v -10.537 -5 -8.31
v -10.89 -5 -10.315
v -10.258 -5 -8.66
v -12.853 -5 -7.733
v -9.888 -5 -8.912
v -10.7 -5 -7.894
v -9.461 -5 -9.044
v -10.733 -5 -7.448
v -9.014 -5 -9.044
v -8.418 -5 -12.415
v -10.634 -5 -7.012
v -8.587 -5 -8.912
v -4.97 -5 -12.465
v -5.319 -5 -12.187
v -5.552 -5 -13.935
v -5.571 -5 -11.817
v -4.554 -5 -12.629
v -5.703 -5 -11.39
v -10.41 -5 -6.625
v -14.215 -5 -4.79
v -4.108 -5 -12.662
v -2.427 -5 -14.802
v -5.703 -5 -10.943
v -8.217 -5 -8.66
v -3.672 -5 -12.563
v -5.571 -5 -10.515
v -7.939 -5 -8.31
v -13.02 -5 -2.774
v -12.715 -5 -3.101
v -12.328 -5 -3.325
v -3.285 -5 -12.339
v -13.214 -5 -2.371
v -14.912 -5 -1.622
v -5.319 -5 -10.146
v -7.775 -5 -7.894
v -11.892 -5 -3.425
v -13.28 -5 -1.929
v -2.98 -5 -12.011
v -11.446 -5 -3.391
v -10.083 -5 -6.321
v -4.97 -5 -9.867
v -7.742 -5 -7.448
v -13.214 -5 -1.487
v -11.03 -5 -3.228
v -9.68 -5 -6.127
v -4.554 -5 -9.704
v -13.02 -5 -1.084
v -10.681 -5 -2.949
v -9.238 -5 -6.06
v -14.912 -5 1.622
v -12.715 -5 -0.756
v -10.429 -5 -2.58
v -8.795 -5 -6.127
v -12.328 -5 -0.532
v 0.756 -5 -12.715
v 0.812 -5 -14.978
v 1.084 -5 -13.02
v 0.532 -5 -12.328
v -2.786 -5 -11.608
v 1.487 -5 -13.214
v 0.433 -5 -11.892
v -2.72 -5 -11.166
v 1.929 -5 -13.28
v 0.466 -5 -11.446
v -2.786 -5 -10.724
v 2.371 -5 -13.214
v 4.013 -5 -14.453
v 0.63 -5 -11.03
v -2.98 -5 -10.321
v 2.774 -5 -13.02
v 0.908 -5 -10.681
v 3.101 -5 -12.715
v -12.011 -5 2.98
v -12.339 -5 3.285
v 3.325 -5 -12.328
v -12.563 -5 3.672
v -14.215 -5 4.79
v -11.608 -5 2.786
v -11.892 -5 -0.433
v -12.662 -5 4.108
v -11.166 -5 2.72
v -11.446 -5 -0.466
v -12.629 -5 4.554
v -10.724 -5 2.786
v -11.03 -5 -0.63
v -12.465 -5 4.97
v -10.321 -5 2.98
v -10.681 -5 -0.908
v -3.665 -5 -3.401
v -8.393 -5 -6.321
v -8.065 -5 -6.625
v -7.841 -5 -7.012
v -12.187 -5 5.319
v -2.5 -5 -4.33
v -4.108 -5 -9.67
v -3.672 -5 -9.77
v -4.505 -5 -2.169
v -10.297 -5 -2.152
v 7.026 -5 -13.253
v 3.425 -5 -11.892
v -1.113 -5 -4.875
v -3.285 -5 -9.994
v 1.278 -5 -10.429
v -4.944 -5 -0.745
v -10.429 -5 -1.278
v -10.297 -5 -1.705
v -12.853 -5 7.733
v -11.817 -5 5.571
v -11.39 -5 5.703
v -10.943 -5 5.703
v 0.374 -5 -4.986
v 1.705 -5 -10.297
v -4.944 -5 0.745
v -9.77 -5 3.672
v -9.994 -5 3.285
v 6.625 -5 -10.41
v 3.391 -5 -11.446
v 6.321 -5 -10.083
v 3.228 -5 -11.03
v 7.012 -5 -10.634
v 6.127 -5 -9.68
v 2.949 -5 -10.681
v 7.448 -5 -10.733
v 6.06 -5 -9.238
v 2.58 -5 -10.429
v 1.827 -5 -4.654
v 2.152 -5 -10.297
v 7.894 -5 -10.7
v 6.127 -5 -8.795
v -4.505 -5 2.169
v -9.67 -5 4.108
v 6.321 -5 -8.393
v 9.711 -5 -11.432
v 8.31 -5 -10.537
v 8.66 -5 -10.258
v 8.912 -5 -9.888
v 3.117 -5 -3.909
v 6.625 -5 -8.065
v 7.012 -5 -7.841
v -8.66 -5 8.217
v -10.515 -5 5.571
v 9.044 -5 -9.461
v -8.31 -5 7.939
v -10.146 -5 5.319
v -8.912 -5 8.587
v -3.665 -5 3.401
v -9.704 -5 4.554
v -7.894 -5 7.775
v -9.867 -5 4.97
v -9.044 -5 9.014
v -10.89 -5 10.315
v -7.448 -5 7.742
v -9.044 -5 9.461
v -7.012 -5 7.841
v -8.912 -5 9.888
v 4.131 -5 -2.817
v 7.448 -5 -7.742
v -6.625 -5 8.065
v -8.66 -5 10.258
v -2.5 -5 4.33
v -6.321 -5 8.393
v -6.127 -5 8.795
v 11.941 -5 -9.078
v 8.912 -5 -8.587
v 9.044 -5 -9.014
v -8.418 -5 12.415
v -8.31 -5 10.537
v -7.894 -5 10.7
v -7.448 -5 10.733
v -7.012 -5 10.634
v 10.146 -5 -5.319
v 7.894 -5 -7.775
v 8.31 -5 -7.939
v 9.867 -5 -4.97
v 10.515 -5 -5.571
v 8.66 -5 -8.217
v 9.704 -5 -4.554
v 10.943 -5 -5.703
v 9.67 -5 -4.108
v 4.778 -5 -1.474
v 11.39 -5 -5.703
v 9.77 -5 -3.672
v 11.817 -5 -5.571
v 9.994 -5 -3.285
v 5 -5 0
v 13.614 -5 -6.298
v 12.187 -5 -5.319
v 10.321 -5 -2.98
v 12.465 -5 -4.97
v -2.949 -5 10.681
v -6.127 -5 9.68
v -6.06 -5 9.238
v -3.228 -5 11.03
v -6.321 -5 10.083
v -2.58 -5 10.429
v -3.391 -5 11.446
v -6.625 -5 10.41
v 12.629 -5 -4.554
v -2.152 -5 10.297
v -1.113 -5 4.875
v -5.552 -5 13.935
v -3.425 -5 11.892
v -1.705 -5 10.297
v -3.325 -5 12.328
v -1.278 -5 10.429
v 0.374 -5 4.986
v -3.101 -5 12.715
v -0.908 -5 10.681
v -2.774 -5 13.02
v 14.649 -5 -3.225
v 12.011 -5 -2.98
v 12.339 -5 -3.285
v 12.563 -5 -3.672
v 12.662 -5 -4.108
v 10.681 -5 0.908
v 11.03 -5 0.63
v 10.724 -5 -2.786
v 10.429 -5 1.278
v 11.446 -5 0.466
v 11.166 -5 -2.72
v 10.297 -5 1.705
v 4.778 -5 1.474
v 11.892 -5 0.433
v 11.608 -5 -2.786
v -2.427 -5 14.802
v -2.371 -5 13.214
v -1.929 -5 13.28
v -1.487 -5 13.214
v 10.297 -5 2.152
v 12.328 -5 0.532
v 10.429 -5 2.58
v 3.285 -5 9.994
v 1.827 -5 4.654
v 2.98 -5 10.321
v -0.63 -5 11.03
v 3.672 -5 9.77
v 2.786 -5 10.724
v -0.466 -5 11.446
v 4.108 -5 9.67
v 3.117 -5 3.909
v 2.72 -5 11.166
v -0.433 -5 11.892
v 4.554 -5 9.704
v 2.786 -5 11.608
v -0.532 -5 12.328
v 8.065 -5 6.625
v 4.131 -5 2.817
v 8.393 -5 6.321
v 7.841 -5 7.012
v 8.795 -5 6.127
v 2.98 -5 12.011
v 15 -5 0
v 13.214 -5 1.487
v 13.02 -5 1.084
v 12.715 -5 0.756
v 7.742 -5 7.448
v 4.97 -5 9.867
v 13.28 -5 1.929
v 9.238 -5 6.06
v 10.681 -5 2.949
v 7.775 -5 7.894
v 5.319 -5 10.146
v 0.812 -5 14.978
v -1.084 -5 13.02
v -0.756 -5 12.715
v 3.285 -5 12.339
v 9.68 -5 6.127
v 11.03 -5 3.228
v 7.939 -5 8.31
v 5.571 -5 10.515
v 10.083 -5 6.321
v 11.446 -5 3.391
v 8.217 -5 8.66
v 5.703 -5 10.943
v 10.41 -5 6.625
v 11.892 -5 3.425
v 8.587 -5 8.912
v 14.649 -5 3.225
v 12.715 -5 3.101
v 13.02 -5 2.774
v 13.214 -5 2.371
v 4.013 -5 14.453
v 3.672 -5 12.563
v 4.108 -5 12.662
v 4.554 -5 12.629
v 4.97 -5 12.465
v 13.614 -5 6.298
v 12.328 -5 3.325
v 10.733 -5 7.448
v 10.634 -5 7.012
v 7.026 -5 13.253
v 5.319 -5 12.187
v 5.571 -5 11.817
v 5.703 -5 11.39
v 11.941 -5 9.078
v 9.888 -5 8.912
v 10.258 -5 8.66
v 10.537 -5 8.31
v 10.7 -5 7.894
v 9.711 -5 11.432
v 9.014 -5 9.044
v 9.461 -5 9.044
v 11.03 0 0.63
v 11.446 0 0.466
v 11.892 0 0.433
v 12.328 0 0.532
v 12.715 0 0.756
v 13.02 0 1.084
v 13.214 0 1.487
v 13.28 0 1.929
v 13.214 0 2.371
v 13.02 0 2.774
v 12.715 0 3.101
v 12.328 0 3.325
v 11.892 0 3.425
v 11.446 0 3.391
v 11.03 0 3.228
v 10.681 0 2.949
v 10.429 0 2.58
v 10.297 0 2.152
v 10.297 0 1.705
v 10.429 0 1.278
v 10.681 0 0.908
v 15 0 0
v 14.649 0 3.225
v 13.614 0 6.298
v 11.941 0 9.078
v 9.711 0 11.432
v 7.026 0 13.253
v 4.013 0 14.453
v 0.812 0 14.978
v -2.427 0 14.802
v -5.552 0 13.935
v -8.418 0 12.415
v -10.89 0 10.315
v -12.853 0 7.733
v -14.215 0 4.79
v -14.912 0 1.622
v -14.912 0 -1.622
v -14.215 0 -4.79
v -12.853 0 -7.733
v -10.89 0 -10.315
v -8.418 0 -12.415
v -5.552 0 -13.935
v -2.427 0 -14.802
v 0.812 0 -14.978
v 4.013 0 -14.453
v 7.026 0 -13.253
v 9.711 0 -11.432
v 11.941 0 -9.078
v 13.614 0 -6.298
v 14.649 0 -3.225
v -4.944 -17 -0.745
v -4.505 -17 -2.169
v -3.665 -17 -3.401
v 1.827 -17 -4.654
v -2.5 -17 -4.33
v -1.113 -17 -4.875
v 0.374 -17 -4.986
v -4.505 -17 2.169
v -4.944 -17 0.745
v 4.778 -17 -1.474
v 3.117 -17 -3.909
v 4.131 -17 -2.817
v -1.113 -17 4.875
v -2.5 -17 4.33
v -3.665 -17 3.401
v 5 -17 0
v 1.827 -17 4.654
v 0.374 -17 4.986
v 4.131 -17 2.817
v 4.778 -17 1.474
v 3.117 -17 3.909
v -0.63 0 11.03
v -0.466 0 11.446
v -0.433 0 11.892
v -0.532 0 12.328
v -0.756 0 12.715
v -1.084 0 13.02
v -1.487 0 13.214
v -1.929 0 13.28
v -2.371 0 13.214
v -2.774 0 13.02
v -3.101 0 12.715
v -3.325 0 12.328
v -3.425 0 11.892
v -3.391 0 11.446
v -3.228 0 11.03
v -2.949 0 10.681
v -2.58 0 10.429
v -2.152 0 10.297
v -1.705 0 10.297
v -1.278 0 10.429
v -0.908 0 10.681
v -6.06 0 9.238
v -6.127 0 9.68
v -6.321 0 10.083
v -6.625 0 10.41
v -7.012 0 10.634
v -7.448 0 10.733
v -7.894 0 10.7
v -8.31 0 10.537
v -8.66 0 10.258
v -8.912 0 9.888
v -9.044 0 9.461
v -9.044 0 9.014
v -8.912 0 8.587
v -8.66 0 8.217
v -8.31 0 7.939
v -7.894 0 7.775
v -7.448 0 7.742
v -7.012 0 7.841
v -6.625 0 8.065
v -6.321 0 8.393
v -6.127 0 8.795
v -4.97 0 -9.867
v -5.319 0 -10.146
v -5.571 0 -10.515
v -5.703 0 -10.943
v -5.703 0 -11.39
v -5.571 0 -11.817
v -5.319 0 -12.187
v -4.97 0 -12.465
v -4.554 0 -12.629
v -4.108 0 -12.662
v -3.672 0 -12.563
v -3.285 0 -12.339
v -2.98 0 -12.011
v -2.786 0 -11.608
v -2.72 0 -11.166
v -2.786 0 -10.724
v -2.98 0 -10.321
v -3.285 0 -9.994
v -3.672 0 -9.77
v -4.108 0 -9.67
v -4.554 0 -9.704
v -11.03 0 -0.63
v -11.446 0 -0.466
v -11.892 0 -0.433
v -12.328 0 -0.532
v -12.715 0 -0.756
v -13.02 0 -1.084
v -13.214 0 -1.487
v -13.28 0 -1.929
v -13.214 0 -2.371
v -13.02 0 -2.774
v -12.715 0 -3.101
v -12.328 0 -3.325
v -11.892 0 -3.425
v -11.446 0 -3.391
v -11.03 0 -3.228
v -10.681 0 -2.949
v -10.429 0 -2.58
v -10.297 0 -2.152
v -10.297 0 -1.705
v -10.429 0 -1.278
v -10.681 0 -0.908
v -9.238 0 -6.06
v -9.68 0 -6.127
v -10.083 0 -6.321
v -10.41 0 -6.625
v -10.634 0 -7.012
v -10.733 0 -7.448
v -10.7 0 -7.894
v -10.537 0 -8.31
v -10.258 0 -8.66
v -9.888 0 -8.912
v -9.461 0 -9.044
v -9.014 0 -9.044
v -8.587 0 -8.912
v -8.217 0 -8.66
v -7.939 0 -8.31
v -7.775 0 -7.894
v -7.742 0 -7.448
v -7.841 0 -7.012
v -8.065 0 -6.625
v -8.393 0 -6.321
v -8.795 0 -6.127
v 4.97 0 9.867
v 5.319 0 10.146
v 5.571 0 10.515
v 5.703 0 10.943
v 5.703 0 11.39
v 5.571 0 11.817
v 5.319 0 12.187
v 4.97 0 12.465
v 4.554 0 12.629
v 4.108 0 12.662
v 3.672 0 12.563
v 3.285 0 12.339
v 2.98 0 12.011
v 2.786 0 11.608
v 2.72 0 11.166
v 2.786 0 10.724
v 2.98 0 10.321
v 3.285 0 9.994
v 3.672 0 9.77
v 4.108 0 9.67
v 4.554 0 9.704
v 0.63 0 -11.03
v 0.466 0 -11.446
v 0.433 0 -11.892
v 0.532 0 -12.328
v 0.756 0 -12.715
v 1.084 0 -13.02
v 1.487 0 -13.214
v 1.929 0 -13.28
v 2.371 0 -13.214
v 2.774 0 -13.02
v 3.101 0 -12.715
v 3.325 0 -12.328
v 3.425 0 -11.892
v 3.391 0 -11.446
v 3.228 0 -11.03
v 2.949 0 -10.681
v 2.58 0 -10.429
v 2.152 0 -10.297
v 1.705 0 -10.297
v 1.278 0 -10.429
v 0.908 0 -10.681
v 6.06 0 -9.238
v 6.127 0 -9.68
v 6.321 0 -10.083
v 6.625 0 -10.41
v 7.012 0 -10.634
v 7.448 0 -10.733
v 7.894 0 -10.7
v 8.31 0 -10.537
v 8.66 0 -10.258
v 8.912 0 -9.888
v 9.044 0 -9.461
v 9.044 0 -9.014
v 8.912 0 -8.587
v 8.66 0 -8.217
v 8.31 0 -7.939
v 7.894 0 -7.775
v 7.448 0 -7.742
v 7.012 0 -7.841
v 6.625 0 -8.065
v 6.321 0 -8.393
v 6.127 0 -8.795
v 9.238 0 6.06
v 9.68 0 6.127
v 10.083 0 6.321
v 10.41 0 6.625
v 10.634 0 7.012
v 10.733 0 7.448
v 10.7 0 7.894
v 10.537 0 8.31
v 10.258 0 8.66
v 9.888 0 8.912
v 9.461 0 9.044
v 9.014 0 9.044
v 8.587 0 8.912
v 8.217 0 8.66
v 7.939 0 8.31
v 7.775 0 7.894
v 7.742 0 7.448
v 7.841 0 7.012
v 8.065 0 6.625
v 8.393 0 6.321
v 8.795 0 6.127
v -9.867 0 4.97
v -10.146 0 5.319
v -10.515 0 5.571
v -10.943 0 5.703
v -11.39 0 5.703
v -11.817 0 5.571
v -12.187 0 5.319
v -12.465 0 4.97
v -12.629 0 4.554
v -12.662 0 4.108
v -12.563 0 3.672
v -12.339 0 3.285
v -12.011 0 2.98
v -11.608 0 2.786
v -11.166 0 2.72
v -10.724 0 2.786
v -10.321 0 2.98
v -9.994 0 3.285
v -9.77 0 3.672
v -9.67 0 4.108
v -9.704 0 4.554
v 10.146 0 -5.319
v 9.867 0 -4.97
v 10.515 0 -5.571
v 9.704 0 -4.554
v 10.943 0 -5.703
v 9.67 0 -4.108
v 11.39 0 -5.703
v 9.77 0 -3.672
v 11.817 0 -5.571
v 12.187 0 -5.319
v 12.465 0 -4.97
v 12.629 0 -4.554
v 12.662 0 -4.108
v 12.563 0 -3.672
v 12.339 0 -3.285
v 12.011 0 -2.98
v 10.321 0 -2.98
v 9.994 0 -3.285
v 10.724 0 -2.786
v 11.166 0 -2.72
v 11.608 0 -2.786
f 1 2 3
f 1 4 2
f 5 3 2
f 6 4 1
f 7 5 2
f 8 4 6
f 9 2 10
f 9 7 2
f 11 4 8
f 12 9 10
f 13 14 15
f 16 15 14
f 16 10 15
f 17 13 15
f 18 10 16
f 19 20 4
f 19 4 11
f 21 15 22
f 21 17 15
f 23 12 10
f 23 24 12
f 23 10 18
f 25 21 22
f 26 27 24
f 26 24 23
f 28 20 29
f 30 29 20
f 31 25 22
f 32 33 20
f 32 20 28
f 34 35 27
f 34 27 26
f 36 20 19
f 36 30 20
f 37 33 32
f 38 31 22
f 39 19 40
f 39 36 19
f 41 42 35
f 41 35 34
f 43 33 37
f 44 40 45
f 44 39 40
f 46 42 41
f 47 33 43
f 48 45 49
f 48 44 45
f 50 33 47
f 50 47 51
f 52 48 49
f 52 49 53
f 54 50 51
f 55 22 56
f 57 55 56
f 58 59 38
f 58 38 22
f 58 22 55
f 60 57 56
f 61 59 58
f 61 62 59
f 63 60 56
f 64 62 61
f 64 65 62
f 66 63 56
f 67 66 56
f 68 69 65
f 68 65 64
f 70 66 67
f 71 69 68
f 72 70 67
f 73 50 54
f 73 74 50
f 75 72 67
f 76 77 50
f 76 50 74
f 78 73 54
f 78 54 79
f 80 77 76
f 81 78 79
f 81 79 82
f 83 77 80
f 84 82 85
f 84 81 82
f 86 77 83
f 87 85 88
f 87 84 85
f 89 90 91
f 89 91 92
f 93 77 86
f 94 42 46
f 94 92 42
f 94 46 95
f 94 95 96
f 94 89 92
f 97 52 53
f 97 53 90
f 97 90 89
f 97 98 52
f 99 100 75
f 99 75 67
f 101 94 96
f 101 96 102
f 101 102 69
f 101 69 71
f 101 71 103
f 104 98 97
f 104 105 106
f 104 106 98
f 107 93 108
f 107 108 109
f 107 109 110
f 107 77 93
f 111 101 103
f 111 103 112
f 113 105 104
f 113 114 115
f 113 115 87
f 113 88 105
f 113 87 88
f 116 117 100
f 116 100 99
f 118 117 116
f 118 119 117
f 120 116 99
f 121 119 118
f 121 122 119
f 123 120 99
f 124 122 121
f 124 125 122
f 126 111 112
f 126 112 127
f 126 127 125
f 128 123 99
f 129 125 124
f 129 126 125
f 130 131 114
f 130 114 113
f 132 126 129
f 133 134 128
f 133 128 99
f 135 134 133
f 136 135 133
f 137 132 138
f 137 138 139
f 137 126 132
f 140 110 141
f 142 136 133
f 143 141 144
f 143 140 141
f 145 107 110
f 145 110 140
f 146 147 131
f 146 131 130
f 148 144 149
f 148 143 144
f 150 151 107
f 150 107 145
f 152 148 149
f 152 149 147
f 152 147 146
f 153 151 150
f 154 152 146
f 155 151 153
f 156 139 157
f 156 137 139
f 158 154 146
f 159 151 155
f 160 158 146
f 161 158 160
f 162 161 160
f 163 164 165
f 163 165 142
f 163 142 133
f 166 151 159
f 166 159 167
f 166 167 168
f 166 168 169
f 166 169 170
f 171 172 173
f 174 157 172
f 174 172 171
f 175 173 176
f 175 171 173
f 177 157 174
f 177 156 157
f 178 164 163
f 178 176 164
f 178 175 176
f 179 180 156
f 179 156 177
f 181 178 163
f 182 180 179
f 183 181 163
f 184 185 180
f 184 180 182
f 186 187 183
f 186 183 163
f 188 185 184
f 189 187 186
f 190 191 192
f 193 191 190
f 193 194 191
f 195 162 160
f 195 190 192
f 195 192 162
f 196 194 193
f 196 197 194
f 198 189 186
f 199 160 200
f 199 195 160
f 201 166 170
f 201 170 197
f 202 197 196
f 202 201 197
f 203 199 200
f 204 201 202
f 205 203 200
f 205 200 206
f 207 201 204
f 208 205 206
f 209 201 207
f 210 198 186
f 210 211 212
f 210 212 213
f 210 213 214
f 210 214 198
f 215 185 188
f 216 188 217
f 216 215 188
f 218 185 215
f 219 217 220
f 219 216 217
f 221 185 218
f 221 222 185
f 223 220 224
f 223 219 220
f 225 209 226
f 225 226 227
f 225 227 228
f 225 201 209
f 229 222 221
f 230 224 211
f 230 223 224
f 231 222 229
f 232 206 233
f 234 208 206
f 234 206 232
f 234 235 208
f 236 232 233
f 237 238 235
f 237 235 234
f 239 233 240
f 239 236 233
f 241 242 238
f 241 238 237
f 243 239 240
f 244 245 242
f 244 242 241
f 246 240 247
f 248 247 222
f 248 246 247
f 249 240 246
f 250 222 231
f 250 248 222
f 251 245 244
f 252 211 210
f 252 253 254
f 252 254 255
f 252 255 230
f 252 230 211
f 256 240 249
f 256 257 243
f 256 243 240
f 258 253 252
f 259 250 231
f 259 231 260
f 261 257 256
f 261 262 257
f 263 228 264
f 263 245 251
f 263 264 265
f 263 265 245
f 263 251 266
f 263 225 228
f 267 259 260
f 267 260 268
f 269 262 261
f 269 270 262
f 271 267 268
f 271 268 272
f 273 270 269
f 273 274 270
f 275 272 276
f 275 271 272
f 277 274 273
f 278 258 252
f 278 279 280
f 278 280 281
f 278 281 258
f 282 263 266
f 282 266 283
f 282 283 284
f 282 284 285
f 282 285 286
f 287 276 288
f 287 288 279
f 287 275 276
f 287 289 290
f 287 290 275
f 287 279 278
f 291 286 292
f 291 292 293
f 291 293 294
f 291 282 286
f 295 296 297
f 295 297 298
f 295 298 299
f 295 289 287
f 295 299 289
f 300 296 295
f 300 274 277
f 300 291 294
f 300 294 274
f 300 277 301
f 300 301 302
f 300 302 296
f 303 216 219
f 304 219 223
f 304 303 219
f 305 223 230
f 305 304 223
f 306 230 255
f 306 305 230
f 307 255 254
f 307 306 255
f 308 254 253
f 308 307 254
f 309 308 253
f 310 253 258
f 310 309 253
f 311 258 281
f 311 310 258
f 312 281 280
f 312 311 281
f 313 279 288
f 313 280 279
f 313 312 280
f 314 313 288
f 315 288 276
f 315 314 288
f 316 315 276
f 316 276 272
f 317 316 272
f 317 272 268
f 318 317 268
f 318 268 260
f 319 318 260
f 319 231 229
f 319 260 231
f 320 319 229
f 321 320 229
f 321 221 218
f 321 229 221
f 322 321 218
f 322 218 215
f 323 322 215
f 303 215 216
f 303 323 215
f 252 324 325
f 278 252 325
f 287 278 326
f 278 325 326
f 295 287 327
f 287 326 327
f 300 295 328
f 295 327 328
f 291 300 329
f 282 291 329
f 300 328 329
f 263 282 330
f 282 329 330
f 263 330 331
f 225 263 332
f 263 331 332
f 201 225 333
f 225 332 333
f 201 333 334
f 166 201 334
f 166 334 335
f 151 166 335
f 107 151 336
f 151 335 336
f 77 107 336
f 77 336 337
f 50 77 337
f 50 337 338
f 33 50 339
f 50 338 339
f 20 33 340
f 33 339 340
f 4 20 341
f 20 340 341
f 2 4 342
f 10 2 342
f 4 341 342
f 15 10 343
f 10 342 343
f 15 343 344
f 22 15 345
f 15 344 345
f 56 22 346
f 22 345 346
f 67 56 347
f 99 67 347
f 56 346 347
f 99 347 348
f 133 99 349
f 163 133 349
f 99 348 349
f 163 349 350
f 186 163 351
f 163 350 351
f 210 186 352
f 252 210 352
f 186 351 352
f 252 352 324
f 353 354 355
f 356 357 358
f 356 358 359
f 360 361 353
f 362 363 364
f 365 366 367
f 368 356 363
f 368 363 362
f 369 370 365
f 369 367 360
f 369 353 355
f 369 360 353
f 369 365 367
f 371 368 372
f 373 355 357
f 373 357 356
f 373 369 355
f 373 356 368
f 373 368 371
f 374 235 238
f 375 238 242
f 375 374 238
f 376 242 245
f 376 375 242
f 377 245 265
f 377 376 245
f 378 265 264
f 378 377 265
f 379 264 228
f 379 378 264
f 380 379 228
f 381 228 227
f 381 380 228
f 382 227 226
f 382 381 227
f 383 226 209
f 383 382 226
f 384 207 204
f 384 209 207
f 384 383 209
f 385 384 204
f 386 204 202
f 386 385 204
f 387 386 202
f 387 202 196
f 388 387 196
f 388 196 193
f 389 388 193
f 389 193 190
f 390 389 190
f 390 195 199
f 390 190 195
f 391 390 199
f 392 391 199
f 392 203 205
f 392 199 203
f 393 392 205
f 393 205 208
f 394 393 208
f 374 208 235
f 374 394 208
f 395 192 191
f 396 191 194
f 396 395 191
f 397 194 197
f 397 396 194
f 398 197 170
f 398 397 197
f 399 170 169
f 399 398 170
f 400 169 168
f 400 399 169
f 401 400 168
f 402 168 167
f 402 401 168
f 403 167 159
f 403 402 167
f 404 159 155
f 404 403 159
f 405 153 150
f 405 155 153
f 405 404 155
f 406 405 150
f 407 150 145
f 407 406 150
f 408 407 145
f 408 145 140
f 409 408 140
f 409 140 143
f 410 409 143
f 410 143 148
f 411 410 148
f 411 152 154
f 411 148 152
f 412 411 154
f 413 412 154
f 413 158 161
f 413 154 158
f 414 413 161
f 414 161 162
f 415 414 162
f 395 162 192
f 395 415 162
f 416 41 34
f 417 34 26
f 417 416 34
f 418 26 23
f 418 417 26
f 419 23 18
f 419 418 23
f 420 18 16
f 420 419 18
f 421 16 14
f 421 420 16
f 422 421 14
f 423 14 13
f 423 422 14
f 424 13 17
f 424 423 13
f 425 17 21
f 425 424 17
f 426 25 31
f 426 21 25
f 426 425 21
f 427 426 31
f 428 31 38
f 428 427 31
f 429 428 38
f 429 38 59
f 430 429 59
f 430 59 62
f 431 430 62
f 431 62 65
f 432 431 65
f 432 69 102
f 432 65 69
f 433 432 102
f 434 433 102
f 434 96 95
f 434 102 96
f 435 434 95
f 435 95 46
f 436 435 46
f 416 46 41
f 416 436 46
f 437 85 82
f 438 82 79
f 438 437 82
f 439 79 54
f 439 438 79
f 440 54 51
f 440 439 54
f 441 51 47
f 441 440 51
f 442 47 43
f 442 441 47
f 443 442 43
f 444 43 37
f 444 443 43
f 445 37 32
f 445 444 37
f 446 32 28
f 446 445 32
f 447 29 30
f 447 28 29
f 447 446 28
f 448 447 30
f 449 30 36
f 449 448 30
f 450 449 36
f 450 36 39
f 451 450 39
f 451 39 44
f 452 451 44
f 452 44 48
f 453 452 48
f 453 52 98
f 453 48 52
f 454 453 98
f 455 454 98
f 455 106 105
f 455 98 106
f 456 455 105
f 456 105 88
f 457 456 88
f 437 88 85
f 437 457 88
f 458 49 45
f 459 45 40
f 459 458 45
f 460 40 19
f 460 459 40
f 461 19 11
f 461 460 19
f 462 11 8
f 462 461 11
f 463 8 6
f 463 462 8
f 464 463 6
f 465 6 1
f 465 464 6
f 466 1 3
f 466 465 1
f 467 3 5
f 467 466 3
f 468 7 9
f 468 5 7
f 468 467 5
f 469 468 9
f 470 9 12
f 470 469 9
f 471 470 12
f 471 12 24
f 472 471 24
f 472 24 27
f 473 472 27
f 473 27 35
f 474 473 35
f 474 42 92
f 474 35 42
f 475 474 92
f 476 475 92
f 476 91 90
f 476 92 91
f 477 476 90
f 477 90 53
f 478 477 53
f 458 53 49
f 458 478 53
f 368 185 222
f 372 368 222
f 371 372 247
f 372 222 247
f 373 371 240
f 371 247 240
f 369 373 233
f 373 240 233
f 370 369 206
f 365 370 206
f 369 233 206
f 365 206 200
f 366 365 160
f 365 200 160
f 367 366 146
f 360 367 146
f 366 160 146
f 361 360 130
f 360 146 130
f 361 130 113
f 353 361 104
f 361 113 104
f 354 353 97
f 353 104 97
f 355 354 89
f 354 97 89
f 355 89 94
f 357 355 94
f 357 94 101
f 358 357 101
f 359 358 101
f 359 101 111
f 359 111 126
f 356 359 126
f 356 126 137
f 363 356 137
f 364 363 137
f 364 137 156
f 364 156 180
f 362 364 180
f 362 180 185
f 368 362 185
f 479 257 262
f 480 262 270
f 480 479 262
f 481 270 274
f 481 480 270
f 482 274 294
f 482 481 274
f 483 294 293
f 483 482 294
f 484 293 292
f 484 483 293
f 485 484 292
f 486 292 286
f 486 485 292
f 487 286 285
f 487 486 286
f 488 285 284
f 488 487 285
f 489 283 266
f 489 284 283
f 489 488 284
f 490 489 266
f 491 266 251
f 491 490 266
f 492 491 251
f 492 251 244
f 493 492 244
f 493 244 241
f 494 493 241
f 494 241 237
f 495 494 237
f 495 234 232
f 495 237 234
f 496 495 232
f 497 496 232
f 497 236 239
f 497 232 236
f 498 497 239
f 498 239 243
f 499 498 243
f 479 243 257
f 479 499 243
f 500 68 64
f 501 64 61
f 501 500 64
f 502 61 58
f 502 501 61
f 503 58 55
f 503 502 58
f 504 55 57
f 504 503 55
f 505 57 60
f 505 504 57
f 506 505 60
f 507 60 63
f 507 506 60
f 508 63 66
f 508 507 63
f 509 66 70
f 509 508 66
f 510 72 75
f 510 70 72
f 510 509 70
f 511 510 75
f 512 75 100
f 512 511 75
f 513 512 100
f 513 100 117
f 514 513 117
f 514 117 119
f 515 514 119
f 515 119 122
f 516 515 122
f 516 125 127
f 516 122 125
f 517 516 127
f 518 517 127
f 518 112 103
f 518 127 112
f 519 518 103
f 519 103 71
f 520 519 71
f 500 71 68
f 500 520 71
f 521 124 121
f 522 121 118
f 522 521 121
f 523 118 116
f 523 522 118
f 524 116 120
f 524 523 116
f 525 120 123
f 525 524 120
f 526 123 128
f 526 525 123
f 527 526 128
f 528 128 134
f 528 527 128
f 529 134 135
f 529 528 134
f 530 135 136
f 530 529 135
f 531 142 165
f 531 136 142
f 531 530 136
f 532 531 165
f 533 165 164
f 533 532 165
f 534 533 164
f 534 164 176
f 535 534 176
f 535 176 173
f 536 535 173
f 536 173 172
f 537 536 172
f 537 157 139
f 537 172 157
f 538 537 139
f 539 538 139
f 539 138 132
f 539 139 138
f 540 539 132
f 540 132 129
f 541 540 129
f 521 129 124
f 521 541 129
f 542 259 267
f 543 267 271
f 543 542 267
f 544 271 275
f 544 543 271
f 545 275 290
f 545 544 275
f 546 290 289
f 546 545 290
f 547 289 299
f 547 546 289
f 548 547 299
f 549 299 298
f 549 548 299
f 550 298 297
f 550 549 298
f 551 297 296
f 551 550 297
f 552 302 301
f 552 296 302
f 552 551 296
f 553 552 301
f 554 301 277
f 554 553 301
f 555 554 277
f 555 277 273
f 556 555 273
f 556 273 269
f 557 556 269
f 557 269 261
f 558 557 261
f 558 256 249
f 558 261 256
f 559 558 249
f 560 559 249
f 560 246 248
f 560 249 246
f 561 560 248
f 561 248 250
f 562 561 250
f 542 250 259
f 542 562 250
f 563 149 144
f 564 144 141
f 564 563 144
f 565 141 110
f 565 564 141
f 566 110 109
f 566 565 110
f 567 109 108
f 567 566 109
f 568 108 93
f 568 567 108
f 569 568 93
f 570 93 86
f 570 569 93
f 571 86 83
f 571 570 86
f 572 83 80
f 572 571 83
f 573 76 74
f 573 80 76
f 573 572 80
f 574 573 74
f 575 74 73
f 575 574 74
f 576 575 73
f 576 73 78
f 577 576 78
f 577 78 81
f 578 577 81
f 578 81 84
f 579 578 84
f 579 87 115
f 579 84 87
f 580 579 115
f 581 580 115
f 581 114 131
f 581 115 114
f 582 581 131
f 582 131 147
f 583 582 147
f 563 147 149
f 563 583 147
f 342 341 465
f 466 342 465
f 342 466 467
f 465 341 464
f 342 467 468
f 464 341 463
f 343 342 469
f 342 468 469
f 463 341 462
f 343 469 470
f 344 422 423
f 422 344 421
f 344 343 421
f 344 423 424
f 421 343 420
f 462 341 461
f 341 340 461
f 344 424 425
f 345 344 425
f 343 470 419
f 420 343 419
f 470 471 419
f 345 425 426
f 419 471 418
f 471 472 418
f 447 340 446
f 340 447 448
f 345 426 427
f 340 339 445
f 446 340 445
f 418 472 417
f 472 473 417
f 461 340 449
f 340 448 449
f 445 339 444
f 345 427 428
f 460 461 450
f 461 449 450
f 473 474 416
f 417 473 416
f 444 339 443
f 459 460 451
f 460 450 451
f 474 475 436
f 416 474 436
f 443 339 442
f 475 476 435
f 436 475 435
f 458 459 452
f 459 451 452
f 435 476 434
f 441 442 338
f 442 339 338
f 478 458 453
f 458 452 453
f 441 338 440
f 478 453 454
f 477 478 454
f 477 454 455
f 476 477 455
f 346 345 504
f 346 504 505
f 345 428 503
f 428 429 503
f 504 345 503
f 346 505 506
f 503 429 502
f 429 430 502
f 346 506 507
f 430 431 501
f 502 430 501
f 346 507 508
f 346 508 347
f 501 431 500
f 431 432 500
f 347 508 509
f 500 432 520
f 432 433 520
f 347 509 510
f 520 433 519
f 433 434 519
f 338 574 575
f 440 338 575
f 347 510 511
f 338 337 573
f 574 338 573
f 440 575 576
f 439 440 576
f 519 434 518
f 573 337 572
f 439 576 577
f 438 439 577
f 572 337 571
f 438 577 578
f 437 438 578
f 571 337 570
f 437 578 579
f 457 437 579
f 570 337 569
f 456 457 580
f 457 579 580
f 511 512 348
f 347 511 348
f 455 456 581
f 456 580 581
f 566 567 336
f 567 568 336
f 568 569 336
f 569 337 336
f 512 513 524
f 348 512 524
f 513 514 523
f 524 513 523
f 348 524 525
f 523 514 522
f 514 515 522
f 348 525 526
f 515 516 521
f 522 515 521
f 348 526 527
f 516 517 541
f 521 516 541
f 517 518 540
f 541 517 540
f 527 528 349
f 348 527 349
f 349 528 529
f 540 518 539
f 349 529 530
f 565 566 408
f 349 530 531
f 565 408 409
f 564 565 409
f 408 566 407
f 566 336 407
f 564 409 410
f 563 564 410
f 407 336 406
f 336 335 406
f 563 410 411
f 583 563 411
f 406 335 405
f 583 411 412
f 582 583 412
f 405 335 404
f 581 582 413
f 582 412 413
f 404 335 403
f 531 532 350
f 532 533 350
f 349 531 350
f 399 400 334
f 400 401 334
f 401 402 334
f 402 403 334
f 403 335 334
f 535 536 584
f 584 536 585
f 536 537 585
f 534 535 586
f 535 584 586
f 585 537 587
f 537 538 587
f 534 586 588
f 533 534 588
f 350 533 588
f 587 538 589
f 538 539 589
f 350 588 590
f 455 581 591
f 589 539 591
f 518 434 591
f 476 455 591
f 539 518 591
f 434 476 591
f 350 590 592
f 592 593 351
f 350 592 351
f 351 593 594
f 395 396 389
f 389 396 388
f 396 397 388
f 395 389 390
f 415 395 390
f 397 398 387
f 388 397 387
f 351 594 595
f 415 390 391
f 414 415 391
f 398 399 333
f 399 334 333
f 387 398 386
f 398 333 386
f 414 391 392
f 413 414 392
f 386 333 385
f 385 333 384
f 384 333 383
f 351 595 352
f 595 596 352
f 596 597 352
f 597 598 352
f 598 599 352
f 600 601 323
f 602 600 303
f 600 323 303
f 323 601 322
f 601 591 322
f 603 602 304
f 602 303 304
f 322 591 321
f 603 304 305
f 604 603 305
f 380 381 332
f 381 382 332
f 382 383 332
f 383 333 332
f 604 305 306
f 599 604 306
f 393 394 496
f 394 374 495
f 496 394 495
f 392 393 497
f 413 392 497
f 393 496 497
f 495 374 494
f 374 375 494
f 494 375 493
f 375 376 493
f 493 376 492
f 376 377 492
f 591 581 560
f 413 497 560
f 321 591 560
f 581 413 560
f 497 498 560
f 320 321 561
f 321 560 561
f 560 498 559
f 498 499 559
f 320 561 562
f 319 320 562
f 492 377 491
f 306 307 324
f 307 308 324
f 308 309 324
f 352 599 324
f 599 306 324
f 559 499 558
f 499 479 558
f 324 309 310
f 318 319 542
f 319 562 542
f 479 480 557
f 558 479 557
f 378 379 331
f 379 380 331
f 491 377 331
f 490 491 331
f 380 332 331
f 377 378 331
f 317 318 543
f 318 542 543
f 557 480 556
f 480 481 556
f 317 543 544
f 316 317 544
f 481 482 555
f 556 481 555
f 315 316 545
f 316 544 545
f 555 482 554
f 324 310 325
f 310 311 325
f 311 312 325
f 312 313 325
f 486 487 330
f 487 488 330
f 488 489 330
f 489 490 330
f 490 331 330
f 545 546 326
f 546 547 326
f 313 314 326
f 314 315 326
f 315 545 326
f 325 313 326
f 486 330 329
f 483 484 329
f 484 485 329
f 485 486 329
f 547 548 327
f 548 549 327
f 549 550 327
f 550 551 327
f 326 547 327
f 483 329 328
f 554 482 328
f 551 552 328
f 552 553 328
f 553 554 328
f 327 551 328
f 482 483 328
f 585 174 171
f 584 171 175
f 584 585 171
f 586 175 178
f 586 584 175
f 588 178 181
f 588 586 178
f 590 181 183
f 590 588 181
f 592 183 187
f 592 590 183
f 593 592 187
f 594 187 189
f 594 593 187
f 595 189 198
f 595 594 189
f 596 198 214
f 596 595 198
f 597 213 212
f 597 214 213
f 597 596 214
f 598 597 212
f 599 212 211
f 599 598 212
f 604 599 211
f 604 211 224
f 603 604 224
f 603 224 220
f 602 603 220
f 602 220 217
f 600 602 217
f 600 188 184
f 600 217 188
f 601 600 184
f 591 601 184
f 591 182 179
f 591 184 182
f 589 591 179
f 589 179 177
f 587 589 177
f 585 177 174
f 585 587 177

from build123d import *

# Parameters (mm, degrees)
F0_R            = 15
F2_DEPTH        = 5
F1_R            = 1.5
F3_DEPTH        = 6
F3_COPIES_COUNT = 12
F4_R            = 5
F5_DEPTH        = 17


# Not quite as in the source:
# - a pattern or mirror of a feature is missing from the dataset's text; its kind, count and spacing are read off the source's solid


with BuildPart() as f2:
    # F0 (on Front) → F2 (new body)
    with BuildSketch(Plane.XZ):
        Circle(F0_R)
    extrude(amount=F2_DEPTH)

    # F1 (on face) → F3 (cut)
    with BuildSketch(Plane.XZ):
        with Locations((-7.5604245067, 9.2375520617)):
            Circle(F1_R)
    f3 = extrude(amount=F3_DEPTH, mode=Mode.SUBTRACT)

    # F3_copies: F3 ×12 about axis
    f3_copies_axis = Axis((0, 0, 0), (0, 1, 0))
    for i in range(1, F3_COPIES_COUNT):
        add(f3.rotate(f3_copies_axis, i * 360 / F3_COPIES_COUNT), mode=Mode.SUBTRACT)

    # F4 (on face) → F5 (join)
    with BuildSketch(Plane.XZ):
        Circle(F4_R)
    extrude(amount=F5_DEPTH)


solid = f2.part
